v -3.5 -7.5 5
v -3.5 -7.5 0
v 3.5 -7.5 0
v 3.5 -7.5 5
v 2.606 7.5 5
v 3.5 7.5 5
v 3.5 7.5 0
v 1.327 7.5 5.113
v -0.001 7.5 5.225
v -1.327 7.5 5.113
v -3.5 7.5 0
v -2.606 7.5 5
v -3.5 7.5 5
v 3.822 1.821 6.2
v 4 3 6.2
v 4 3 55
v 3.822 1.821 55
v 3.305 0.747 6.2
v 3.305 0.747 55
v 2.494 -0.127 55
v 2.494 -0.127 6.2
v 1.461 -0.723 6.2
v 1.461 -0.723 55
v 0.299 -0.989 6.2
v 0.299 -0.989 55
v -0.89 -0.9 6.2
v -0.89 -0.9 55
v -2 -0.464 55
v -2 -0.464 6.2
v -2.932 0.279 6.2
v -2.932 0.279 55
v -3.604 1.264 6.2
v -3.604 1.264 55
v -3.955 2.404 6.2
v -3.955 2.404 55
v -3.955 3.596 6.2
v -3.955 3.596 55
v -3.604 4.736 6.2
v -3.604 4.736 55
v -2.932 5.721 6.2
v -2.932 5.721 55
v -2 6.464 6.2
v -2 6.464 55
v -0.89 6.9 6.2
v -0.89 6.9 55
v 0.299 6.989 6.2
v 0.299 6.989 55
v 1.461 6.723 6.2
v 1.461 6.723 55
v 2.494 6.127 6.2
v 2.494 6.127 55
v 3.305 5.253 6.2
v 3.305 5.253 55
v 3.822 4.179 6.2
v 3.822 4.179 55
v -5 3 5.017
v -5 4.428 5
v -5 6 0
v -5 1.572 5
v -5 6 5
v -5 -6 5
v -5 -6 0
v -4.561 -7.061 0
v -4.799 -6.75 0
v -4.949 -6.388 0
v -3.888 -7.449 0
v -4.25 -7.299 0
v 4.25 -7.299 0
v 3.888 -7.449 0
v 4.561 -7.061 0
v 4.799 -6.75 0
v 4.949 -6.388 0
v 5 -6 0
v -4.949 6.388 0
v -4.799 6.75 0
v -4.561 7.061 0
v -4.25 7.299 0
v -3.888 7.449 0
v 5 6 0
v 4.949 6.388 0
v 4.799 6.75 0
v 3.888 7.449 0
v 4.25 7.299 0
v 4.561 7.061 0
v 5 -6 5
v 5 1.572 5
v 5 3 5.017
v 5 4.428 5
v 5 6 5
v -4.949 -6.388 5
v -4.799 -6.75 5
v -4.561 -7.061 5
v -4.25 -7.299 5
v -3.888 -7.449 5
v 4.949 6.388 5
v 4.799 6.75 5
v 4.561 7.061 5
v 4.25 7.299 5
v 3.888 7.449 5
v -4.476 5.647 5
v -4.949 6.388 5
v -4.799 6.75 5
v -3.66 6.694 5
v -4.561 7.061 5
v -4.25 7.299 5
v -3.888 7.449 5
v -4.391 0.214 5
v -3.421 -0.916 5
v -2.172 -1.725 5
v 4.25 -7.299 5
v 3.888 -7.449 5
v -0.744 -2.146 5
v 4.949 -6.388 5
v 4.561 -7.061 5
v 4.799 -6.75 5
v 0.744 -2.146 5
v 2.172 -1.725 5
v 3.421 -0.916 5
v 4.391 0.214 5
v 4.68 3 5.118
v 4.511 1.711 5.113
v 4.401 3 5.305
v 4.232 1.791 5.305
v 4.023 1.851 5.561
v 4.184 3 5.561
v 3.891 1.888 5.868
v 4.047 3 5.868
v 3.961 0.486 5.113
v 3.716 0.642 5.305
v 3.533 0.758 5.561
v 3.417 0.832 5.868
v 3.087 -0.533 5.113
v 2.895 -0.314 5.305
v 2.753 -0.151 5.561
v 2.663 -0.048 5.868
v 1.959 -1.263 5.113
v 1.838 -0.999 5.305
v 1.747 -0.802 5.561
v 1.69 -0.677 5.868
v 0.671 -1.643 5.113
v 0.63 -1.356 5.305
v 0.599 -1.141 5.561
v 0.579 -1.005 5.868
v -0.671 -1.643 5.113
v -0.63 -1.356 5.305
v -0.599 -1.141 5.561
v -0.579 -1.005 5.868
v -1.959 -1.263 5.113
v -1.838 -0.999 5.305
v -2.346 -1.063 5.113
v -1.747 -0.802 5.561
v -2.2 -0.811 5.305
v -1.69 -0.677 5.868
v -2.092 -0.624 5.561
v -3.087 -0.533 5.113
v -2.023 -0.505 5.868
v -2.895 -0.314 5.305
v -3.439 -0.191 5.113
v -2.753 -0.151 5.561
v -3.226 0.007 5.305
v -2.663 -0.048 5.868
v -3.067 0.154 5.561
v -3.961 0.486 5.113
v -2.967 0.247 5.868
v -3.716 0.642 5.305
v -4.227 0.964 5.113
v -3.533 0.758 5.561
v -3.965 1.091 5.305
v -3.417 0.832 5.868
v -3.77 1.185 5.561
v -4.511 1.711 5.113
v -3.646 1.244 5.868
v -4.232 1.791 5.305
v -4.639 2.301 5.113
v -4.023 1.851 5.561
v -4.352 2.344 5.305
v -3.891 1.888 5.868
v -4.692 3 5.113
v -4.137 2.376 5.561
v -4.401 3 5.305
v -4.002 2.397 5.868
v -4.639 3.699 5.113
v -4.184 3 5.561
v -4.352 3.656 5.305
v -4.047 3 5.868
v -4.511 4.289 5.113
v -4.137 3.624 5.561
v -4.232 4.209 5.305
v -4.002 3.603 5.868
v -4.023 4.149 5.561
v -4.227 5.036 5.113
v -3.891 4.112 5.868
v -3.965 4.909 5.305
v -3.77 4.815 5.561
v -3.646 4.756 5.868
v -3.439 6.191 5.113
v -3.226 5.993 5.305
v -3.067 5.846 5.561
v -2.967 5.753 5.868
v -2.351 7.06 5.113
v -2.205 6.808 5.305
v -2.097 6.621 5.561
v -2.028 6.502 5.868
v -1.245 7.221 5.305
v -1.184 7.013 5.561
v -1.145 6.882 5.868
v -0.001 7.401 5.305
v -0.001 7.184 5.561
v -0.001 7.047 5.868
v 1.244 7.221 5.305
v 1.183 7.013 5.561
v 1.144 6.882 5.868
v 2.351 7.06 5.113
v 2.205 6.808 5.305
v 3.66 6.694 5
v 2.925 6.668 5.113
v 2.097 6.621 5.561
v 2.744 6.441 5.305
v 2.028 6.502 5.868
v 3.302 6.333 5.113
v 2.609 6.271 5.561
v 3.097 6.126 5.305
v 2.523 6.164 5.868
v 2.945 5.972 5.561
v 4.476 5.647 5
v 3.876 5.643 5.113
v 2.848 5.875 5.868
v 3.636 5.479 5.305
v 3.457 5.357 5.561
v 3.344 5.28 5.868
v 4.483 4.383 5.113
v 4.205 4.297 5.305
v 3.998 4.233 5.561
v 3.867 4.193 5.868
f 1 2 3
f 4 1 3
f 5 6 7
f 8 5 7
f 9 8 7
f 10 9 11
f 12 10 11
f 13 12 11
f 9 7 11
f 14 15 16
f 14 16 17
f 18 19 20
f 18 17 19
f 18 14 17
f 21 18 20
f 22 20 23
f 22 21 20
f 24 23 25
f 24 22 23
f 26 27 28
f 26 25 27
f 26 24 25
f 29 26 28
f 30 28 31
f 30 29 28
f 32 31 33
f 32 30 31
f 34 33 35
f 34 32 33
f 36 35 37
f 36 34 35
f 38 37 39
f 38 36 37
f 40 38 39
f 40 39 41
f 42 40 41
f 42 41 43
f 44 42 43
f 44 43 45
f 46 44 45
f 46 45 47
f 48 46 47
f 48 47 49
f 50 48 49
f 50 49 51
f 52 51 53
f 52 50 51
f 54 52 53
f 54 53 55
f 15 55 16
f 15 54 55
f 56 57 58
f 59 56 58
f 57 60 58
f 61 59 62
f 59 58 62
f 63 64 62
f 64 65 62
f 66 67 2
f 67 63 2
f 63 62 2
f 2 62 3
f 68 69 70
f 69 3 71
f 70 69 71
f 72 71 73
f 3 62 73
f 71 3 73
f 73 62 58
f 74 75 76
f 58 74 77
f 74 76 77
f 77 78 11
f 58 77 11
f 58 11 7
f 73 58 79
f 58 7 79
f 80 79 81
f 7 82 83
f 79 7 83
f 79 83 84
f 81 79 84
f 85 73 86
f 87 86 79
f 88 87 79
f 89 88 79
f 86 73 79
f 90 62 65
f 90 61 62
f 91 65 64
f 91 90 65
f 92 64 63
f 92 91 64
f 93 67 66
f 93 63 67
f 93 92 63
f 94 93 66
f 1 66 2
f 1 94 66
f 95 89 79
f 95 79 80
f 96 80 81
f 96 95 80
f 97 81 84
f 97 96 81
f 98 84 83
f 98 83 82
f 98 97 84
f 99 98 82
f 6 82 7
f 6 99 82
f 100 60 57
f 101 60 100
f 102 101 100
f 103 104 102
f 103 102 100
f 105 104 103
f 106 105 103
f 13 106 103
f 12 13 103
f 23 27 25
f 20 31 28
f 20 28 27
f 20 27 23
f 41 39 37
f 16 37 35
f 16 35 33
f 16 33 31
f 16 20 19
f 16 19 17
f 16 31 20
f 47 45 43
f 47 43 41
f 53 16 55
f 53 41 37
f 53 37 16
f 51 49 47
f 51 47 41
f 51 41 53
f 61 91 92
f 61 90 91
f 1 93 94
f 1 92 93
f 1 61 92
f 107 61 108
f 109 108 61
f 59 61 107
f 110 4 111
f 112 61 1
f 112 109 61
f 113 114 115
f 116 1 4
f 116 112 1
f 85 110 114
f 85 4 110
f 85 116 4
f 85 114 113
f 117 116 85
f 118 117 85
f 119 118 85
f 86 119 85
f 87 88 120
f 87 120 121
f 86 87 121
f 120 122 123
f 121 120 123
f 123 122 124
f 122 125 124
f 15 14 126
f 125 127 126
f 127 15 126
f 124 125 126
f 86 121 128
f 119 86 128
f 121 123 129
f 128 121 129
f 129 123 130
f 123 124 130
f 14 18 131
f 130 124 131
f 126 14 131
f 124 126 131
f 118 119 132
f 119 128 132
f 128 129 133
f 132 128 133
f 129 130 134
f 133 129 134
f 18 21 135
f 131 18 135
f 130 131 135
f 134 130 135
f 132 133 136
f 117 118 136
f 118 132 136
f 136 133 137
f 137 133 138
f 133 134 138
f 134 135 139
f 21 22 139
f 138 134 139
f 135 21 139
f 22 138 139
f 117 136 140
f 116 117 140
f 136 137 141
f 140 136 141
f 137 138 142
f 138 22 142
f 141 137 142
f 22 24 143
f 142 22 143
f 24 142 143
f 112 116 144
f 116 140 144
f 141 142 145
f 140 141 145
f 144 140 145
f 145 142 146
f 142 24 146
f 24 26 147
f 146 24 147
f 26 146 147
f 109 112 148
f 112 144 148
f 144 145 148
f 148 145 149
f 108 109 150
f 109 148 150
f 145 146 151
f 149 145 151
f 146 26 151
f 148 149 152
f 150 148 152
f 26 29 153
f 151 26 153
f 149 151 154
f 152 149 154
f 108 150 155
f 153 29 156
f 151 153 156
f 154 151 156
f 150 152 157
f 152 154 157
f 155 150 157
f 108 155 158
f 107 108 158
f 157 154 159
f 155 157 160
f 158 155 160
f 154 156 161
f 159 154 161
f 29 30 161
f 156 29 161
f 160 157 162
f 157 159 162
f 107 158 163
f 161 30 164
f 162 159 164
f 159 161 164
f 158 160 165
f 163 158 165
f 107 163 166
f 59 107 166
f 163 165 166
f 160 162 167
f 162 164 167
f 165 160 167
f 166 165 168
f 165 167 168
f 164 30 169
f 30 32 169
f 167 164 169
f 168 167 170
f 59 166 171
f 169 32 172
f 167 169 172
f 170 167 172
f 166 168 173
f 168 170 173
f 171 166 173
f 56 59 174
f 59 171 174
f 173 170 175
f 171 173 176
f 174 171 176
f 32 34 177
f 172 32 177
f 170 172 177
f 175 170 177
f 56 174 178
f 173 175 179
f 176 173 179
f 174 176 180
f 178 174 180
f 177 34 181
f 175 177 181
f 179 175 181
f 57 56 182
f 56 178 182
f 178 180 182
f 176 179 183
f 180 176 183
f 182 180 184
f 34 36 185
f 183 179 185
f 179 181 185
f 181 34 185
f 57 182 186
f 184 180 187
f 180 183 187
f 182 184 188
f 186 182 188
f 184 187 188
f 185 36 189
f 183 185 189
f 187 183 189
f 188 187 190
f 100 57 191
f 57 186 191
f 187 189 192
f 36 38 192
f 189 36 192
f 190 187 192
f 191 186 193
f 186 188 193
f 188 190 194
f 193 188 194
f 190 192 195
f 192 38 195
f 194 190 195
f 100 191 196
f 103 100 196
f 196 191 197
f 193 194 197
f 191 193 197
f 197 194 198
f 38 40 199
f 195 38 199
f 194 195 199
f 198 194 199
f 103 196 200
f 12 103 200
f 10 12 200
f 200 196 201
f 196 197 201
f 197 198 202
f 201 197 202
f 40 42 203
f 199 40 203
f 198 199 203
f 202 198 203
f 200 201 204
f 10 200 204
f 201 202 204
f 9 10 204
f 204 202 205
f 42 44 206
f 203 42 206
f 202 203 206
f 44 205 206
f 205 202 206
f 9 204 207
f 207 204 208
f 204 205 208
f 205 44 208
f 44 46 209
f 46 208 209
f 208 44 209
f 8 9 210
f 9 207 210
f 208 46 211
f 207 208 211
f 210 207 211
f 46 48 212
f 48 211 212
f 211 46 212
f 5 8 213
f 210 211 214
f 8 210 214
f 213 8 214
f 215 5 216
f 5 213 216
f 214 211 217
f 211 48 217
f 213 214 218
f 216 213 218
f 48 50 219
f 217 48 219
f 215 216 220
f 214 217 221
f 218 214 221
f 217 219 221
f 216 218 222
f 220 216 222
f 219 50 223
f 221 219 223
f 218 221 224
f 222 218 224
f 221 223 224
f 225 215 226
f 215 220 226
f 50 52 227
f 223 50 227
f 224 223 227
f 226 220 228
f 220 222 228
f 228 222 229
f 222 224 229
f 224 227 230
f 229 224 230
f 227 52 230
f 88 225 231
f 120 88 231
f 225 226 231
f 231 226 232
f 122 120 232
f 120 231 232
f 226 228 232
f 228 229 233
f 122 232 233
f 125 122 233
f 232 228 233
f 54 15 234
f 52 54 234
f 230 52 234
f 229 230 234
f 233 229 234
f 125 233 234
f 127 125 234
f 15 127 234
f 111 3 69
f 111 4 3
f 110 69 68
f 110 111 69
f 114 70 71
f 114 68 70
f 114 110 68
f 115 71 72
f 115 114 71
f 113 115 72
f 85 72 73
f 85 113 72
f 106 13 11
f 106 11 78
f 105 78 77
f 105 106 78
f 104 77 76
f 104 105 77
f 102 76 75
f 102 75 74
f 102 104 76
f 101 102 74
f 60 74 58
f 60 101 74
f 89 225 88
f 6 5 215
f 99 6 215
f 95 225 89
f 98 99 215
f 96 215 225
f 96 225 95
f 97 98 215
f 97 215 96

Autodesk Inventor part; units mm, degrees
ref_plane "YZ Plane" through (0, 0, 0) normal (1, 0, 0) x (0, 1, 0)
ref_plane "XZ Plane" through (0, 0, 0) normal (0, 1, 0) x (-1, 0, 0)
ref_plane "XY Plane" through (0, 0, 0) normal (0, 0, 1) x (1, 0, 0)
sketch "スケッチ1" plane through (0, 0, 0) normal (0, 0, 1) x (1, 0, 0)
  line L0 (5, 7.5) -> (-5, 7.5)
  line L1 (-5, 7.5) -> (-5, -7.5)
  line L2 (-5, -7.5) -> (5, -7.5)
  line L3 (5, -7.5) -> (5, 7.5)
  line L4 (5, 7.5) -> (-5, -7.5) construction
  line L5 (-5, 7.5) -> (5, -7.5) construction
  point P0 (0, 0)
  dimension "d0" = 10
  dimension "d1" = 15
extrude "押し出し1" add sketch "スケッチ1" along normal blind 5
sketch "スケッチ2" plane through (0, 0, 5) normal (0, 0, 1) x (1, 0, 0)
  line L0 (0, 0) -> (0, 3)
  circle A0 centre (0, 3) radius 4
  dimension "d4" = 3
  dimension "d5" = 8
extrude "押し出し2" add sketch "スケッチ2" along normal blind 50
fillet "フィレット1" radius 1.2 1 edges at (-4, 3, 5)
fillet "フィレット2" radius 1.5 4 edges at (5, 7.5, 2.5) (-5, 7.5, 2.5) (5, -7.5, 2.5) (-5, -7.5, 2.5)
properties part number "slidev"
